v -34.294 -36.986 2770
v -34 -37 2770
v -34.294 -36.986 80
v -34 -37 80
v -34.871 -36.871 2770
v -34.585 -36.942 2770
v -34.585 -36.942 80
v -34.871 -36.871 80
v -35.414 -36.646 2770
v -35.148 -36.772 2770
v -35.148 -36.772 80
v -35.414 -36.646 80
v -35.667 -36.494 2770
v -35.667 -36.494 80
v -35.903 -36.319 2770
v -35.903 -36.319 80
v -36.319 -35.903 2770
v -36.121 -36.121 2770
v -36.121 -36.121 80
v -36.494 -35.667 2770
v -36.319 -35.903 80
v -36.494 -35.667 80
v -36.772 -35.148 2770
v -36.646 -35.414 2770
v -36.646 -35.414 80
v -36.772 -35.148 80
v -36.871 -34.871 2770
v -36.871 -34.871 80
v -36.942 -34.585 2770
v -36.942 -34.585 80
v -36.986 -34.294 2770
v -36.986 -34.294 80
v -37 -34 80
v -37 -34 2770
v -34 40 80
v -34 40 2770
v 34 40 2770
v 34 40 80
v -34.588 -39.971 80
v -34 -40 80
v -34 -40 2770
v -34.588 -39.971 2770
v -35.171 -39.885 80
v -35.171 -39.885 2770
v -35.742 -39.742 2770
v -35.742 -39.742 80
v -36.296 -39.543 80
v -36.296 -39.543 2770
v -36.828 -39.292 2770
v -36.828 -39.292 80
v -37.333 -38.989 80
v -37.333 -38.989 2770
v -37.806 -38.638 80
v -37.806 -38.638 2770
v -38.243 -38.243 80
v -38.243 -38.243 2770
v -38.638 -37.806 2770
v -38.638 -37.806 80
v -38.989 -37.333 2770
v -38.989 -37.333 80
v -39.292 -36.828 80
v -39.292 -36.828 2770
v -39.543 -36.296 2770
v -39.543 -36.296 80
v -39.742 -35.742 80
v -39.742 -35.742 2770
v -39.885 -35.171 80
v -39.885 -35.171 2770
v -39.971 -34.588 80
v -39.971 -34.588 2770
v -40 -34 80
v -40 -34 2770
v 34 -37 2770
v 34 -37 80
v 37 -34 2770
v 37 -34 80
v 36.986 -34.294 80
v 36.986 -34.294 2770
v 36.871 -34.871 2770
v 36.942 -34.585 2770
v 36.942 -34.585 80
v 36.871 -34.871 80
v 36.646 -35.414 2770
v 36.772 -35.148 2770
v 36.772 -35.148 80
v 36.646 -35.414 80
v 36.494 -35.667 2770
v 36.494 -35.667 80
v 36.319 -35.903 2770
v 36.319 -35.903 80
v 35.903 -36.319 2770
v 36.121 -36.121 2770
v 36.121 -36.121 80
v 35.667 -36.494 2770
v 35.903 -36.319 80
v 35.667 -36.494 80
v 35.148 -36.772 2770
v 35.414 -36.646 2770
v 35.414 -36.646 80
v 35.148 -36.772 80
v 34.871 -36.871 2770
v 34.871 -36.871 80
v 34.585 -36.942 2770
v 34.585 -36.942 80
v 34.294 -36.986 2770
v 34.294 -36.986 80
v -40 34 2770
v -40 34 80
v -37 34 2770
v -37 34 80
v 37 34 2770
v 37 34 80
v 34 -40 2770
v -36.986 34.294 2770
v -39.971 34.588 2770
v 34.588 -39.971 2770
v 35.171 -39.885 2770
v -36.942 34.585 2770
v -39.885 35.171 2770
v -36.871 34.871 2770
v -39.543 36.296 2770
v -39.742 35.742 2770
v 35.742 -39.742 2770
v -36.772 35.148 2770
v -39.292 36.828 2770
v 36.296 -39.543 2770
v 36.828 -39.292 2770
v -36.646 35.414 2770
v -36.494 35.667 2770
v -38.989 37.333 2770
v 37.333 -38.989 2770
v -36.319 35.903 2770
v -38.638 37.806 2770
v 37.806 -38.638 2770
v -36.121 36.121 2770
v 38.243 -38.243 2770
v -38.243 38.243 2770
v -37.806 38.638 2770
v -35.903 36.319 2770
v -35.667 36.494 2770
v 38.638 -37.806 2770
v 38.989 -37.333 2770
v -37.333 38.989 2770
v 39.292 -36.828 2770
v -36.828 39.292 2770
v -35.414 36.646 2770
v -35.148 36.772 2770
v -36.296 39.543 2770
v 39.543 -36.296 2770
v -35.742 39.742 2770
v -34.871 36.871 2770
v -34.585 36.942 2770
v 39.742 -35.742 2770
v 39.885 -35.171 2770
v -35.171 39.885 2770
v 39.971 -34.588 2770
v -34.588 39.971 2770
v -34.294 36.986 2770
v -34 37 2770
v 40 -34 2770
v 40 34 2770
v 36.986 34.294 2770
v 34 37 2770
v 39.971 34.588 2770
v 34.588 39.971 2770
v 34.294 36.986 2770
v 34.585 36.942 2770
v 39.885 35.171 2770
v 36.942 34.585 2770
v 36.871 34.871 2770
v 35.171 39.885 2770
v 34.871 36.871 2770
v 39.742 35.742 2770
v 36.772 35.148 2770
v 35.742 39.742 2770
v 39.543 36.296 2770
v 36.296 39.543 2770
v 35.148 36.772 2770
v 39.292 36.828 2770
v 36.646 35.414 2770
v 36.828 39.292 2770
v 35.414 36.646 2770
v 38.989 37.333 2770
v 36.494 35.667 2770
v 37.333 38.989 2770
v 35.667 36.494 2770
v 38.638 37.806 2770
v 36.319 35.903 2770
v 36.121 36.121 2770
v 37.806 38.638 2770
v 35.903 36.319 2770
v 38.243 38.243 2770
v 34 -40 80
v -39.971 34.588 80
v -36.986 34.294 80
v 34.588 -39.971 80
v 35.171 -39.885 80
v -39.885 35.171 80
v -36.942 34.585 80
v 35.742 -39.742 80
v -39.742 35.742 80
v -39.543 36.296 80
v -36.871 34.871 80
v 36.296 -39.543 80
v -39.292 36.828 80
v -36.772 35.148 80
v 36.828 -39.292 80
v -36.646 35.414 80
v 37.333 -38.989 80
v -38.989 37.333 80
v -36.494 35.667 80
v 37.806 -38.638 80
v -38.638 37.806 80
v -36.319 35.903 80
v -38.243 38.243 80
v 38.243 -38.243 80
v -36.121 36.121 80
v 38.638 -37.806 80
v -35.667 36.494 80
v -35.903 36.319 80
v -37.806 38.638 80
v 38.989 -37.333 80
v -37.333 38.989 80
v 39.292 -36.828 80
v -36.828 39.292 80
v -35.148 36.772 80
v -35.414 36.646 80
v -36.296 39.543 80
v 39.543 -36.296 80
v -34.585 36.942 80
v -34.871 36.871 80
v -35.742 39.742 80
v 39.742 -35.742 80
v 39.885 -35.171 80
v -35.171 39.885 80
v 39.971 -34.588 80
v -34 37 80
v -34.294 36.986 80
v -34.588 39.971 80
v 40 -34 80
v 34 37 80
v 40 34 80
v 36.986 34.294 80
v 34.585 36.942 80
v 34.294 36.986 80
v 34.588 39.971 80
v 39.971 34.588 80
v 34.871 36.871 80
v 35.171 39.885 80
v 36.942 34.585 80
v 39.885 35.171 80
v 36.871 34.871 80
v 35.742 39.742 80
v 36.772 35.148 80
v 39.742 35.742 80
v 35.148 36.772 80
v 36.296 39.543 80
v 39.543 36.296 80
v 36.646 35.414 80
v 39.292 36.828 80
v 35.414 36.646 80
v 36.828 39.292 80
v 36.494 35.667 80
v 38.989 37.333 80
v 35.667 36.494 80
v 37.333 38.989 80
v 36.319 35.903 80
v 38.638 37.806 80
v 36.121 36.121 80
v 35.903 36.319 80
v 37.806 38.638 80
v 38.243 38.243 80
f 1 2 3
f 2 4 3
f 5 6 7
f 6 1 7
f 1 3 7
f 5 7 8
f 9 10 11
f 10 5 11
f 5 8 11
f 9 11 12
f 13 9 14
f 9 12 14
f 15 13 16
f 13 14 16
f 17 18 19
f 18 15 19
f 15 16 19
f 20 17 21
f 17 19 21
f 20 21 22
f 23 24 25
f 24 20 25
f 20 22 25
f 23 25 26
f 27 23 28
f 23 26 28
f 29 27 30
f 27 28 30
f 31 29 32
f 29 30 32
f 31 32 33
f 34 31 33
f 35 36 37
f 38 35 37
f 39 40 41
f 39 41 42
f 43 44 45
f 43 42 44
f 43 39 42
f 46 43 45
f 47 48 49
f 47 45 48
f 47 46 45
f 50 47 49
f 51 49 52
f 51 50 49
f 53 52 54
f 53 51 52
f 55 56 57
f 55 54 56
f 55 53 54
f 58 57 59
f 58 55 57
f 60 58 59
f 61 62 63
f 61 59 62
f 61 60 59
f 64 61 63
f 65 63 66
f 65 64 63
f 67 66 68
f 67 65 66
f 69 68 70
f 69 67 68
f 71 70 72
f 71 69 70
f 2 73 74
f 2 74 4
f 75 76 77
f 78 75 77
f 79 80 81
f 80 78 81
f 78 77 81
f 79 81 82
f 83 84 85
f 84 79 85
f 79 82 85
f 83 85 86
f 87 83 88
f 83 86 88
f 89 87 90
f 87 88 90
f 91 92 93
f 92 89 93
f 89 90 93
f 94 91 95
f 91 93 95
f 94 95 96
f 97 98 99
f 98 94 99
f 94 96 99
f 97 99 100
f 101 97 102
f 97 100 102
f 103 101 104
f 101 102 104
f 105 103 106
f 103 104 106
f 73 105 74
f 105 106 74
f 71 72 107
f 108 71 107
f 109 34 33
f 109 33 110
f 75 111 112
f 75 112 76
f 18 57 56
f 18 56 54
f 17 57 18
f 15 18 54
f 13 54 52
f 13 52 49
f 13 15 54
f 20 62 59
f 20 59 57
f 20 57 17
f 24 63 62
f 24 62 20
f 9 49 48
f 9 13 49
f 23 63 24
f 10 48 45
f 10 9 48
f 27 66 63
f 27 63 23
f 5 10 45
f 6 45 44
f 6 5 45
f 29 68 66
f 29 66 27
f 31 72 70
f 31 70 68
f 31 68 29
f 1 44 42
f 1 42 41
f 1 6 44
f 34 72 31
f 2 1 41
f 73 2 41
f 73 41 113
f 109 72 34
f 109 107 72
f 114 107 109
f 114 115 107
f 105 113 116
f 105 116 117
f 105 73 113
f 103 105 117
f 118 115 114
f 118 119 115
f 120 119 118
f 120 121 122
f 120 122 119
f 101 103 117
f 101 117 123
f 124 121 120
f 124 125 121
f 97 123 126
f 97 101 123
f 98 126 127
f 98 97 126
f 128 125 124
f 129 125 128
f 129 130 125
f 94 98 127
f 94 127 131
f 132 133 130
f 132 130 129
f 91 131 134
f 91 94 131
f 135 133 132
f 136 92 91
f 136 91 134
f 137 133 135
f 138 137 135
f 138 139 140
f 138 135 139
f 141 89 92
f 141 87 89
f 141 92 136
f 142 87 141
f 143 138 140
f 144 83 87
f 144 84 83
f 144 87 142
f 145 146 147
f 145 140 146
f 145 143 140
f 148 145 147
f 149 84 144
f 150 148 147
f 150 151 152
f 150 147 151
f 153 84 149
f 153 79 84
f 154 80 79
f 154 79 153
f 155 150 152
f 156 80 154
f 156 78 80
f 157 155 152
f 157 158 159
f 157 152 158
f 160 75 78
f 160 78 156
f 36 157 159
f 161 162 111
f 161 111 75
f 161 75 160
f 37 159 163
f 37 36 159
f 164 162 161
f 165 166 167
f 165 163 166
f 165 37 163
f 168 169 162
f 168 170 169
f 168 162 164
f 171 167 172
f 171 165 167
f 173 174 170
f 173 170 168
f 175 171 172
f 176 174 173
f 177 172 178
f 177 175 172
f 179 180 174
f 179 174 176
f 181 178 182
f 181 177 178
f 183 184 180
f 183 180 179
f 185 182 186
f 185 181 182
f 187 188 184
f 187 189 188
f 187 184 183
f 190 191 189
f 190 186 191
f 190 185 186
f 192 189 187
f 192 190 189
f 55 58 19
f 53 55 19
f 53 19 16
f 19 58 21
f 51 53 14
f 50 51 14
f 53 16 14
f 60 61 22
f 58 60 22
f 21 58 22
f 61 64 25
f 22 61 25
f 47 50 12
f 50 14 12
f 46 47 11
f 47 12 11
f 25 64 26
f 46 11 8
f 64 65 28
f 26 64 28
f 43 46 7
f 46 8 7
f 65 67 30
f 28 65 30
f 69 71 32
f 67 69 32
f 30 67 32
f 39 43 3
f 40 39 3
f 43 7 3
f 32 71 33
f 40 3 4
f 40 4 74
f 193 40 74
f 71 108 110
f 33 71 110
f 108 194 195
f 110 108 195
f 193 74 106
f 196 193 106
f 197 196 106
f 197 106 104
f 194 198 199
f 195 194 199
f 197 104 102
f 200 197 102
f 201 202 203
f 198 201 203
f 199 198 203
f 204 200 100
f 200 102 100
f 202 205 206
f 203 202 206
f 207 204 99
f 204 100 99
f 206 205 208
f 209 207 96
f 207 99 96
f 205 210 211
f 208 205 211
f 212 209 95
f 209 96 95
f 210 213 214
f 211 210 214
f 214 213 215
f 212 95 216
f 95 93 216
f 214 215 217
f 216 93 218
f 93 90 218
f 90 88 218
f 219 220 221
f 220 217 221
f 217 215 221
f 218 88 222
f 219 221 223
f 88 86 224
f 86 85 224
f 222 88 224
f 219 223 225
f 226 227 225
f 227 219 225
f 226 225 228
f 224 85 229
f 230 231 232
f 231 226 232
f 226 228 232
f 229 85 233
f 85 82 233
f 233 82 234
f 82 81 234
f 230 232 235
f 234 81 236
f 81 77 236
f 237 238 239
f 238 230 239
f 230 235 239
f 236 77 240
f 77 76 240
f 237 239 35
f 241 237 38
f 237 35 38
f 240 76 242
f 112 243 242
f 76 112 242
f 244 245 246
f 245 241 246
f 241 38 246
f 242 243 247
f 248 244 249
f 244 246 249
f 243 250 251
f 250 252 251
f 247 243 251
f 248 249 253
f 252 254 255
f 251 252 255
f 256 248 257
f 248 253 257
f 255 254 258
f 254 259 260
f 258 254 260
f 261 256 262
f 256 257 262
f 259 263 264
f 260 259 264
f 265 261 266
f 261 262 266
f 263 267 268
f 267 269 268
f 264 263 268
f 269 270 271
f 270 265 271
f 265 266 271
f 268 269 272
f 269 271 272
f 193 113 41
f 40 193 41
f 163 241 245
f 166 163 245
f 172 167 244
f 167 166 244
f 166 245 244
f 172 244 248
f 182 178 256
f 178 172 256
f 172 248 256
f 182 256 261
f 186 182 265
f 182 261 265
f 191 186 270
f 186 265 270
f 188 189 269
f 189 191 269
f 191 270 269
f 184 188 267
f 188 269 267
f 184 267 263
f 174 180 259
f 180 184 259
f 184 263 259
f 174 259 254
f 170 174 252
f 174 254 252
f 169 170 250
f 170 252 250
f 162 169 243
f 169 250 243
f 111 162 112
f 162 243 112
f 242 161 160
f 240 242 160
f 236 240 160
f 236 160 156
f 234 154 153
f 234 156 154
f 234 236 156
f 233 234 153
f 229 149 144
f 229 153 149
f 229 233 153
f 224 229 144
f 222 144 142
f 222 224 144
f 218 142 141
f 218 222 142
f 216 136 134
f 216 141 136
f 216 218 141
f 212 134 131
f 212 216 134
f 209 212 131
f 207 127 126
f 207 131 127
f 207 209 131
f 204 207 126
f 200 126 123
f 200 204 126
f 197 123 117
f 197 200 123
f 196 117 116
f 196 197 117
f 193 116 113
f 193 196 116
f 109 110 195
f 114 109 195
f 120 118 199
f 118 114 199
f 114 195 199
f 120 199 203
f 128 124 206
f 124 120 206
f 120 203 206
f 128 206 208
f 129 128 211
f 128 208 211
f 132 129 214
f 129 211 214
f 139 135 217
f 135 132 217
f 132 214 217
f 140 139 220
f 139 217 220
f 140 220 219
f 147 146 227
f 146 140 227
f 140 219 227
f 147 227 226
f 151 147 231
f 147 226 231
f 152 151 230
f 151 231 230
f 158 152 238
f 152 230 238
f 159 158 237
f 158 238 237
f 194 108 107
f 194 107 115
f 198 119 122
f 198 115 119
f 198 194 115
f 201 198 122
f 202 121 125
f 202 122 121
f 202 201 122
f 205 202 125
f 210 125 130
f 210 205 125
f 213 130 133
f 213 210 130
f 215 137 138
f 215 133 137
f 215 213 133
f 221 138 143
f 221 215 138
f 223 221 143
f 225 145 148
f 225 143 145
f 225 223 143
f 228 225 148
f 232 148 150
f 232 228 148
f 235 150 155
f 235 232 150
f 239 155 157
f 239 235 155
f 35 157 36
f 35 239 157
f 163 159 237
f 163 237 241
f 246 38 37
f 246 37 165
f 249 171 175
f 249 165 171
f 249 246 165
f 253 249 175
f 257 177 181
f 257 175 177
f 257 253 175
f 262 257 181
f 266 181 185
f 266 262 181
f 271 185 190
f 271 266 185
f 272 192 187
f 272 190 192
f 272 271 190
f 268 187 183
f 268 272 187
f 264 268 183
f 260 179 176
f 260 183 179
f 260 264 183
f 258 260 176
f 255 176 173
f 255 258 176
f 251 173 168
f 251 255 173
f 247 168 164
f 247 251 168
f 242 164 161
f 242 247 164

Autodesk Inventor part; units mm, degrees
ref_plane "YZ Plane" through (0, 0, 0) normal (1, 0, 0) x (0, 1, 0)
ref_plane "Start Plane" through (0, 0, 80) normal (0, 0, 1) x (1, 0, 0)
ref_plane "End Plane" through (0, 0, 2770) normal (0, 0, 1) x (1, 0, 0)
sketch "Sketch" plane through (0, 0, 0) normal (0, 0, 1) x (1, 0, 0)
  line L0 (-40, -34) -> (-40, 34)
  line L1 (-34, 40) -> (34, 40)
  line L2 (40, 34) -> (40, -34)
  line L3 (34, -40) -> (-34, -40)
  arc A0 (-40, -34) -> (-34, -40) centre (-34, -34) ccw
  arc A1 (40, 34) -> (34, 40) centre (34, 34) ccw
  arc A2 (-34, 40) -> (-40, 34) centre (-34, 34) ccw
  arc A3 (34, -40) -> (40, -34) centre (34, -34) ccw
  arc A4 (-34, 37) -> (-37, 34) centre (-34, 34) ccw
  line L4 (-34, 37) -> (34, 37)
  arc A5 (37, 34) -> (34, 37) centre (34, 34) ccw
  line L5 (37, 34) -> (37, -34)
  arc A6 (34, -37) -> (37, -34) centre (34, -34) ccw
  line L6 (34, -37) -> (-34, -37)
  arc A7 (-37, -34) -> (-34, -37) centre (-34, -34) ccw
  line L7 (-37, -34) -> (-37, 34)
  line L8 (0, 57.7397) -> (0, -57.7397) construction
  line L9 (-57.7397, 0) -> (57.7397, 0) construction
  dimension "d7" = 6
  dimension "d9" = 80
  dimension "d11" = 80
  dimension "d12" = 3
  dimension "d15" = 40
  dimension "d16" = 40
extrude "Body" add sketch "Sketch" along normal up to surface (2690 mm away) from surface at 80
sketch "Sketch3" plane through (0, 0, 0) normal (0, 0, 1) x (1, 0, 0)
  line L0 (0, 0) -> (10, 0)
ref_plane "Work Plane3" through (0, 0, 0) normal (0, -1, 0) x (1, 0, 0)
sketch "Sketch4" plane through (0, 0, 0) normal (0, -1, 0) x (1, 0, 0)
  line L0 (-2, 80) -> (12, 80) projected
  line L1 (-2, 2770) -> (12, 2770) projected
  dimension "d18" = 2690
equation "\"d7\" = G_IR"
equation "\"d9\" = G_W"
equation "\"d11\" = G_H"
equation "\"d12\" = G_T"
equation "\"d15\" = 0.5 * d9"
equation "\"d16\" = 0.5 * d11"
equation "\"d3\" = G_L"
equation "\"G_W\" = 80"
equation "\"G_H\" = 80"
equation "\"G_T\" = 3"
equation "\"G_IR\" = 6"
equation "\"G_L\" = d18"
properties part number "ISO 4019 - 80x80x3 - 2690" material "Steel, Mild"
